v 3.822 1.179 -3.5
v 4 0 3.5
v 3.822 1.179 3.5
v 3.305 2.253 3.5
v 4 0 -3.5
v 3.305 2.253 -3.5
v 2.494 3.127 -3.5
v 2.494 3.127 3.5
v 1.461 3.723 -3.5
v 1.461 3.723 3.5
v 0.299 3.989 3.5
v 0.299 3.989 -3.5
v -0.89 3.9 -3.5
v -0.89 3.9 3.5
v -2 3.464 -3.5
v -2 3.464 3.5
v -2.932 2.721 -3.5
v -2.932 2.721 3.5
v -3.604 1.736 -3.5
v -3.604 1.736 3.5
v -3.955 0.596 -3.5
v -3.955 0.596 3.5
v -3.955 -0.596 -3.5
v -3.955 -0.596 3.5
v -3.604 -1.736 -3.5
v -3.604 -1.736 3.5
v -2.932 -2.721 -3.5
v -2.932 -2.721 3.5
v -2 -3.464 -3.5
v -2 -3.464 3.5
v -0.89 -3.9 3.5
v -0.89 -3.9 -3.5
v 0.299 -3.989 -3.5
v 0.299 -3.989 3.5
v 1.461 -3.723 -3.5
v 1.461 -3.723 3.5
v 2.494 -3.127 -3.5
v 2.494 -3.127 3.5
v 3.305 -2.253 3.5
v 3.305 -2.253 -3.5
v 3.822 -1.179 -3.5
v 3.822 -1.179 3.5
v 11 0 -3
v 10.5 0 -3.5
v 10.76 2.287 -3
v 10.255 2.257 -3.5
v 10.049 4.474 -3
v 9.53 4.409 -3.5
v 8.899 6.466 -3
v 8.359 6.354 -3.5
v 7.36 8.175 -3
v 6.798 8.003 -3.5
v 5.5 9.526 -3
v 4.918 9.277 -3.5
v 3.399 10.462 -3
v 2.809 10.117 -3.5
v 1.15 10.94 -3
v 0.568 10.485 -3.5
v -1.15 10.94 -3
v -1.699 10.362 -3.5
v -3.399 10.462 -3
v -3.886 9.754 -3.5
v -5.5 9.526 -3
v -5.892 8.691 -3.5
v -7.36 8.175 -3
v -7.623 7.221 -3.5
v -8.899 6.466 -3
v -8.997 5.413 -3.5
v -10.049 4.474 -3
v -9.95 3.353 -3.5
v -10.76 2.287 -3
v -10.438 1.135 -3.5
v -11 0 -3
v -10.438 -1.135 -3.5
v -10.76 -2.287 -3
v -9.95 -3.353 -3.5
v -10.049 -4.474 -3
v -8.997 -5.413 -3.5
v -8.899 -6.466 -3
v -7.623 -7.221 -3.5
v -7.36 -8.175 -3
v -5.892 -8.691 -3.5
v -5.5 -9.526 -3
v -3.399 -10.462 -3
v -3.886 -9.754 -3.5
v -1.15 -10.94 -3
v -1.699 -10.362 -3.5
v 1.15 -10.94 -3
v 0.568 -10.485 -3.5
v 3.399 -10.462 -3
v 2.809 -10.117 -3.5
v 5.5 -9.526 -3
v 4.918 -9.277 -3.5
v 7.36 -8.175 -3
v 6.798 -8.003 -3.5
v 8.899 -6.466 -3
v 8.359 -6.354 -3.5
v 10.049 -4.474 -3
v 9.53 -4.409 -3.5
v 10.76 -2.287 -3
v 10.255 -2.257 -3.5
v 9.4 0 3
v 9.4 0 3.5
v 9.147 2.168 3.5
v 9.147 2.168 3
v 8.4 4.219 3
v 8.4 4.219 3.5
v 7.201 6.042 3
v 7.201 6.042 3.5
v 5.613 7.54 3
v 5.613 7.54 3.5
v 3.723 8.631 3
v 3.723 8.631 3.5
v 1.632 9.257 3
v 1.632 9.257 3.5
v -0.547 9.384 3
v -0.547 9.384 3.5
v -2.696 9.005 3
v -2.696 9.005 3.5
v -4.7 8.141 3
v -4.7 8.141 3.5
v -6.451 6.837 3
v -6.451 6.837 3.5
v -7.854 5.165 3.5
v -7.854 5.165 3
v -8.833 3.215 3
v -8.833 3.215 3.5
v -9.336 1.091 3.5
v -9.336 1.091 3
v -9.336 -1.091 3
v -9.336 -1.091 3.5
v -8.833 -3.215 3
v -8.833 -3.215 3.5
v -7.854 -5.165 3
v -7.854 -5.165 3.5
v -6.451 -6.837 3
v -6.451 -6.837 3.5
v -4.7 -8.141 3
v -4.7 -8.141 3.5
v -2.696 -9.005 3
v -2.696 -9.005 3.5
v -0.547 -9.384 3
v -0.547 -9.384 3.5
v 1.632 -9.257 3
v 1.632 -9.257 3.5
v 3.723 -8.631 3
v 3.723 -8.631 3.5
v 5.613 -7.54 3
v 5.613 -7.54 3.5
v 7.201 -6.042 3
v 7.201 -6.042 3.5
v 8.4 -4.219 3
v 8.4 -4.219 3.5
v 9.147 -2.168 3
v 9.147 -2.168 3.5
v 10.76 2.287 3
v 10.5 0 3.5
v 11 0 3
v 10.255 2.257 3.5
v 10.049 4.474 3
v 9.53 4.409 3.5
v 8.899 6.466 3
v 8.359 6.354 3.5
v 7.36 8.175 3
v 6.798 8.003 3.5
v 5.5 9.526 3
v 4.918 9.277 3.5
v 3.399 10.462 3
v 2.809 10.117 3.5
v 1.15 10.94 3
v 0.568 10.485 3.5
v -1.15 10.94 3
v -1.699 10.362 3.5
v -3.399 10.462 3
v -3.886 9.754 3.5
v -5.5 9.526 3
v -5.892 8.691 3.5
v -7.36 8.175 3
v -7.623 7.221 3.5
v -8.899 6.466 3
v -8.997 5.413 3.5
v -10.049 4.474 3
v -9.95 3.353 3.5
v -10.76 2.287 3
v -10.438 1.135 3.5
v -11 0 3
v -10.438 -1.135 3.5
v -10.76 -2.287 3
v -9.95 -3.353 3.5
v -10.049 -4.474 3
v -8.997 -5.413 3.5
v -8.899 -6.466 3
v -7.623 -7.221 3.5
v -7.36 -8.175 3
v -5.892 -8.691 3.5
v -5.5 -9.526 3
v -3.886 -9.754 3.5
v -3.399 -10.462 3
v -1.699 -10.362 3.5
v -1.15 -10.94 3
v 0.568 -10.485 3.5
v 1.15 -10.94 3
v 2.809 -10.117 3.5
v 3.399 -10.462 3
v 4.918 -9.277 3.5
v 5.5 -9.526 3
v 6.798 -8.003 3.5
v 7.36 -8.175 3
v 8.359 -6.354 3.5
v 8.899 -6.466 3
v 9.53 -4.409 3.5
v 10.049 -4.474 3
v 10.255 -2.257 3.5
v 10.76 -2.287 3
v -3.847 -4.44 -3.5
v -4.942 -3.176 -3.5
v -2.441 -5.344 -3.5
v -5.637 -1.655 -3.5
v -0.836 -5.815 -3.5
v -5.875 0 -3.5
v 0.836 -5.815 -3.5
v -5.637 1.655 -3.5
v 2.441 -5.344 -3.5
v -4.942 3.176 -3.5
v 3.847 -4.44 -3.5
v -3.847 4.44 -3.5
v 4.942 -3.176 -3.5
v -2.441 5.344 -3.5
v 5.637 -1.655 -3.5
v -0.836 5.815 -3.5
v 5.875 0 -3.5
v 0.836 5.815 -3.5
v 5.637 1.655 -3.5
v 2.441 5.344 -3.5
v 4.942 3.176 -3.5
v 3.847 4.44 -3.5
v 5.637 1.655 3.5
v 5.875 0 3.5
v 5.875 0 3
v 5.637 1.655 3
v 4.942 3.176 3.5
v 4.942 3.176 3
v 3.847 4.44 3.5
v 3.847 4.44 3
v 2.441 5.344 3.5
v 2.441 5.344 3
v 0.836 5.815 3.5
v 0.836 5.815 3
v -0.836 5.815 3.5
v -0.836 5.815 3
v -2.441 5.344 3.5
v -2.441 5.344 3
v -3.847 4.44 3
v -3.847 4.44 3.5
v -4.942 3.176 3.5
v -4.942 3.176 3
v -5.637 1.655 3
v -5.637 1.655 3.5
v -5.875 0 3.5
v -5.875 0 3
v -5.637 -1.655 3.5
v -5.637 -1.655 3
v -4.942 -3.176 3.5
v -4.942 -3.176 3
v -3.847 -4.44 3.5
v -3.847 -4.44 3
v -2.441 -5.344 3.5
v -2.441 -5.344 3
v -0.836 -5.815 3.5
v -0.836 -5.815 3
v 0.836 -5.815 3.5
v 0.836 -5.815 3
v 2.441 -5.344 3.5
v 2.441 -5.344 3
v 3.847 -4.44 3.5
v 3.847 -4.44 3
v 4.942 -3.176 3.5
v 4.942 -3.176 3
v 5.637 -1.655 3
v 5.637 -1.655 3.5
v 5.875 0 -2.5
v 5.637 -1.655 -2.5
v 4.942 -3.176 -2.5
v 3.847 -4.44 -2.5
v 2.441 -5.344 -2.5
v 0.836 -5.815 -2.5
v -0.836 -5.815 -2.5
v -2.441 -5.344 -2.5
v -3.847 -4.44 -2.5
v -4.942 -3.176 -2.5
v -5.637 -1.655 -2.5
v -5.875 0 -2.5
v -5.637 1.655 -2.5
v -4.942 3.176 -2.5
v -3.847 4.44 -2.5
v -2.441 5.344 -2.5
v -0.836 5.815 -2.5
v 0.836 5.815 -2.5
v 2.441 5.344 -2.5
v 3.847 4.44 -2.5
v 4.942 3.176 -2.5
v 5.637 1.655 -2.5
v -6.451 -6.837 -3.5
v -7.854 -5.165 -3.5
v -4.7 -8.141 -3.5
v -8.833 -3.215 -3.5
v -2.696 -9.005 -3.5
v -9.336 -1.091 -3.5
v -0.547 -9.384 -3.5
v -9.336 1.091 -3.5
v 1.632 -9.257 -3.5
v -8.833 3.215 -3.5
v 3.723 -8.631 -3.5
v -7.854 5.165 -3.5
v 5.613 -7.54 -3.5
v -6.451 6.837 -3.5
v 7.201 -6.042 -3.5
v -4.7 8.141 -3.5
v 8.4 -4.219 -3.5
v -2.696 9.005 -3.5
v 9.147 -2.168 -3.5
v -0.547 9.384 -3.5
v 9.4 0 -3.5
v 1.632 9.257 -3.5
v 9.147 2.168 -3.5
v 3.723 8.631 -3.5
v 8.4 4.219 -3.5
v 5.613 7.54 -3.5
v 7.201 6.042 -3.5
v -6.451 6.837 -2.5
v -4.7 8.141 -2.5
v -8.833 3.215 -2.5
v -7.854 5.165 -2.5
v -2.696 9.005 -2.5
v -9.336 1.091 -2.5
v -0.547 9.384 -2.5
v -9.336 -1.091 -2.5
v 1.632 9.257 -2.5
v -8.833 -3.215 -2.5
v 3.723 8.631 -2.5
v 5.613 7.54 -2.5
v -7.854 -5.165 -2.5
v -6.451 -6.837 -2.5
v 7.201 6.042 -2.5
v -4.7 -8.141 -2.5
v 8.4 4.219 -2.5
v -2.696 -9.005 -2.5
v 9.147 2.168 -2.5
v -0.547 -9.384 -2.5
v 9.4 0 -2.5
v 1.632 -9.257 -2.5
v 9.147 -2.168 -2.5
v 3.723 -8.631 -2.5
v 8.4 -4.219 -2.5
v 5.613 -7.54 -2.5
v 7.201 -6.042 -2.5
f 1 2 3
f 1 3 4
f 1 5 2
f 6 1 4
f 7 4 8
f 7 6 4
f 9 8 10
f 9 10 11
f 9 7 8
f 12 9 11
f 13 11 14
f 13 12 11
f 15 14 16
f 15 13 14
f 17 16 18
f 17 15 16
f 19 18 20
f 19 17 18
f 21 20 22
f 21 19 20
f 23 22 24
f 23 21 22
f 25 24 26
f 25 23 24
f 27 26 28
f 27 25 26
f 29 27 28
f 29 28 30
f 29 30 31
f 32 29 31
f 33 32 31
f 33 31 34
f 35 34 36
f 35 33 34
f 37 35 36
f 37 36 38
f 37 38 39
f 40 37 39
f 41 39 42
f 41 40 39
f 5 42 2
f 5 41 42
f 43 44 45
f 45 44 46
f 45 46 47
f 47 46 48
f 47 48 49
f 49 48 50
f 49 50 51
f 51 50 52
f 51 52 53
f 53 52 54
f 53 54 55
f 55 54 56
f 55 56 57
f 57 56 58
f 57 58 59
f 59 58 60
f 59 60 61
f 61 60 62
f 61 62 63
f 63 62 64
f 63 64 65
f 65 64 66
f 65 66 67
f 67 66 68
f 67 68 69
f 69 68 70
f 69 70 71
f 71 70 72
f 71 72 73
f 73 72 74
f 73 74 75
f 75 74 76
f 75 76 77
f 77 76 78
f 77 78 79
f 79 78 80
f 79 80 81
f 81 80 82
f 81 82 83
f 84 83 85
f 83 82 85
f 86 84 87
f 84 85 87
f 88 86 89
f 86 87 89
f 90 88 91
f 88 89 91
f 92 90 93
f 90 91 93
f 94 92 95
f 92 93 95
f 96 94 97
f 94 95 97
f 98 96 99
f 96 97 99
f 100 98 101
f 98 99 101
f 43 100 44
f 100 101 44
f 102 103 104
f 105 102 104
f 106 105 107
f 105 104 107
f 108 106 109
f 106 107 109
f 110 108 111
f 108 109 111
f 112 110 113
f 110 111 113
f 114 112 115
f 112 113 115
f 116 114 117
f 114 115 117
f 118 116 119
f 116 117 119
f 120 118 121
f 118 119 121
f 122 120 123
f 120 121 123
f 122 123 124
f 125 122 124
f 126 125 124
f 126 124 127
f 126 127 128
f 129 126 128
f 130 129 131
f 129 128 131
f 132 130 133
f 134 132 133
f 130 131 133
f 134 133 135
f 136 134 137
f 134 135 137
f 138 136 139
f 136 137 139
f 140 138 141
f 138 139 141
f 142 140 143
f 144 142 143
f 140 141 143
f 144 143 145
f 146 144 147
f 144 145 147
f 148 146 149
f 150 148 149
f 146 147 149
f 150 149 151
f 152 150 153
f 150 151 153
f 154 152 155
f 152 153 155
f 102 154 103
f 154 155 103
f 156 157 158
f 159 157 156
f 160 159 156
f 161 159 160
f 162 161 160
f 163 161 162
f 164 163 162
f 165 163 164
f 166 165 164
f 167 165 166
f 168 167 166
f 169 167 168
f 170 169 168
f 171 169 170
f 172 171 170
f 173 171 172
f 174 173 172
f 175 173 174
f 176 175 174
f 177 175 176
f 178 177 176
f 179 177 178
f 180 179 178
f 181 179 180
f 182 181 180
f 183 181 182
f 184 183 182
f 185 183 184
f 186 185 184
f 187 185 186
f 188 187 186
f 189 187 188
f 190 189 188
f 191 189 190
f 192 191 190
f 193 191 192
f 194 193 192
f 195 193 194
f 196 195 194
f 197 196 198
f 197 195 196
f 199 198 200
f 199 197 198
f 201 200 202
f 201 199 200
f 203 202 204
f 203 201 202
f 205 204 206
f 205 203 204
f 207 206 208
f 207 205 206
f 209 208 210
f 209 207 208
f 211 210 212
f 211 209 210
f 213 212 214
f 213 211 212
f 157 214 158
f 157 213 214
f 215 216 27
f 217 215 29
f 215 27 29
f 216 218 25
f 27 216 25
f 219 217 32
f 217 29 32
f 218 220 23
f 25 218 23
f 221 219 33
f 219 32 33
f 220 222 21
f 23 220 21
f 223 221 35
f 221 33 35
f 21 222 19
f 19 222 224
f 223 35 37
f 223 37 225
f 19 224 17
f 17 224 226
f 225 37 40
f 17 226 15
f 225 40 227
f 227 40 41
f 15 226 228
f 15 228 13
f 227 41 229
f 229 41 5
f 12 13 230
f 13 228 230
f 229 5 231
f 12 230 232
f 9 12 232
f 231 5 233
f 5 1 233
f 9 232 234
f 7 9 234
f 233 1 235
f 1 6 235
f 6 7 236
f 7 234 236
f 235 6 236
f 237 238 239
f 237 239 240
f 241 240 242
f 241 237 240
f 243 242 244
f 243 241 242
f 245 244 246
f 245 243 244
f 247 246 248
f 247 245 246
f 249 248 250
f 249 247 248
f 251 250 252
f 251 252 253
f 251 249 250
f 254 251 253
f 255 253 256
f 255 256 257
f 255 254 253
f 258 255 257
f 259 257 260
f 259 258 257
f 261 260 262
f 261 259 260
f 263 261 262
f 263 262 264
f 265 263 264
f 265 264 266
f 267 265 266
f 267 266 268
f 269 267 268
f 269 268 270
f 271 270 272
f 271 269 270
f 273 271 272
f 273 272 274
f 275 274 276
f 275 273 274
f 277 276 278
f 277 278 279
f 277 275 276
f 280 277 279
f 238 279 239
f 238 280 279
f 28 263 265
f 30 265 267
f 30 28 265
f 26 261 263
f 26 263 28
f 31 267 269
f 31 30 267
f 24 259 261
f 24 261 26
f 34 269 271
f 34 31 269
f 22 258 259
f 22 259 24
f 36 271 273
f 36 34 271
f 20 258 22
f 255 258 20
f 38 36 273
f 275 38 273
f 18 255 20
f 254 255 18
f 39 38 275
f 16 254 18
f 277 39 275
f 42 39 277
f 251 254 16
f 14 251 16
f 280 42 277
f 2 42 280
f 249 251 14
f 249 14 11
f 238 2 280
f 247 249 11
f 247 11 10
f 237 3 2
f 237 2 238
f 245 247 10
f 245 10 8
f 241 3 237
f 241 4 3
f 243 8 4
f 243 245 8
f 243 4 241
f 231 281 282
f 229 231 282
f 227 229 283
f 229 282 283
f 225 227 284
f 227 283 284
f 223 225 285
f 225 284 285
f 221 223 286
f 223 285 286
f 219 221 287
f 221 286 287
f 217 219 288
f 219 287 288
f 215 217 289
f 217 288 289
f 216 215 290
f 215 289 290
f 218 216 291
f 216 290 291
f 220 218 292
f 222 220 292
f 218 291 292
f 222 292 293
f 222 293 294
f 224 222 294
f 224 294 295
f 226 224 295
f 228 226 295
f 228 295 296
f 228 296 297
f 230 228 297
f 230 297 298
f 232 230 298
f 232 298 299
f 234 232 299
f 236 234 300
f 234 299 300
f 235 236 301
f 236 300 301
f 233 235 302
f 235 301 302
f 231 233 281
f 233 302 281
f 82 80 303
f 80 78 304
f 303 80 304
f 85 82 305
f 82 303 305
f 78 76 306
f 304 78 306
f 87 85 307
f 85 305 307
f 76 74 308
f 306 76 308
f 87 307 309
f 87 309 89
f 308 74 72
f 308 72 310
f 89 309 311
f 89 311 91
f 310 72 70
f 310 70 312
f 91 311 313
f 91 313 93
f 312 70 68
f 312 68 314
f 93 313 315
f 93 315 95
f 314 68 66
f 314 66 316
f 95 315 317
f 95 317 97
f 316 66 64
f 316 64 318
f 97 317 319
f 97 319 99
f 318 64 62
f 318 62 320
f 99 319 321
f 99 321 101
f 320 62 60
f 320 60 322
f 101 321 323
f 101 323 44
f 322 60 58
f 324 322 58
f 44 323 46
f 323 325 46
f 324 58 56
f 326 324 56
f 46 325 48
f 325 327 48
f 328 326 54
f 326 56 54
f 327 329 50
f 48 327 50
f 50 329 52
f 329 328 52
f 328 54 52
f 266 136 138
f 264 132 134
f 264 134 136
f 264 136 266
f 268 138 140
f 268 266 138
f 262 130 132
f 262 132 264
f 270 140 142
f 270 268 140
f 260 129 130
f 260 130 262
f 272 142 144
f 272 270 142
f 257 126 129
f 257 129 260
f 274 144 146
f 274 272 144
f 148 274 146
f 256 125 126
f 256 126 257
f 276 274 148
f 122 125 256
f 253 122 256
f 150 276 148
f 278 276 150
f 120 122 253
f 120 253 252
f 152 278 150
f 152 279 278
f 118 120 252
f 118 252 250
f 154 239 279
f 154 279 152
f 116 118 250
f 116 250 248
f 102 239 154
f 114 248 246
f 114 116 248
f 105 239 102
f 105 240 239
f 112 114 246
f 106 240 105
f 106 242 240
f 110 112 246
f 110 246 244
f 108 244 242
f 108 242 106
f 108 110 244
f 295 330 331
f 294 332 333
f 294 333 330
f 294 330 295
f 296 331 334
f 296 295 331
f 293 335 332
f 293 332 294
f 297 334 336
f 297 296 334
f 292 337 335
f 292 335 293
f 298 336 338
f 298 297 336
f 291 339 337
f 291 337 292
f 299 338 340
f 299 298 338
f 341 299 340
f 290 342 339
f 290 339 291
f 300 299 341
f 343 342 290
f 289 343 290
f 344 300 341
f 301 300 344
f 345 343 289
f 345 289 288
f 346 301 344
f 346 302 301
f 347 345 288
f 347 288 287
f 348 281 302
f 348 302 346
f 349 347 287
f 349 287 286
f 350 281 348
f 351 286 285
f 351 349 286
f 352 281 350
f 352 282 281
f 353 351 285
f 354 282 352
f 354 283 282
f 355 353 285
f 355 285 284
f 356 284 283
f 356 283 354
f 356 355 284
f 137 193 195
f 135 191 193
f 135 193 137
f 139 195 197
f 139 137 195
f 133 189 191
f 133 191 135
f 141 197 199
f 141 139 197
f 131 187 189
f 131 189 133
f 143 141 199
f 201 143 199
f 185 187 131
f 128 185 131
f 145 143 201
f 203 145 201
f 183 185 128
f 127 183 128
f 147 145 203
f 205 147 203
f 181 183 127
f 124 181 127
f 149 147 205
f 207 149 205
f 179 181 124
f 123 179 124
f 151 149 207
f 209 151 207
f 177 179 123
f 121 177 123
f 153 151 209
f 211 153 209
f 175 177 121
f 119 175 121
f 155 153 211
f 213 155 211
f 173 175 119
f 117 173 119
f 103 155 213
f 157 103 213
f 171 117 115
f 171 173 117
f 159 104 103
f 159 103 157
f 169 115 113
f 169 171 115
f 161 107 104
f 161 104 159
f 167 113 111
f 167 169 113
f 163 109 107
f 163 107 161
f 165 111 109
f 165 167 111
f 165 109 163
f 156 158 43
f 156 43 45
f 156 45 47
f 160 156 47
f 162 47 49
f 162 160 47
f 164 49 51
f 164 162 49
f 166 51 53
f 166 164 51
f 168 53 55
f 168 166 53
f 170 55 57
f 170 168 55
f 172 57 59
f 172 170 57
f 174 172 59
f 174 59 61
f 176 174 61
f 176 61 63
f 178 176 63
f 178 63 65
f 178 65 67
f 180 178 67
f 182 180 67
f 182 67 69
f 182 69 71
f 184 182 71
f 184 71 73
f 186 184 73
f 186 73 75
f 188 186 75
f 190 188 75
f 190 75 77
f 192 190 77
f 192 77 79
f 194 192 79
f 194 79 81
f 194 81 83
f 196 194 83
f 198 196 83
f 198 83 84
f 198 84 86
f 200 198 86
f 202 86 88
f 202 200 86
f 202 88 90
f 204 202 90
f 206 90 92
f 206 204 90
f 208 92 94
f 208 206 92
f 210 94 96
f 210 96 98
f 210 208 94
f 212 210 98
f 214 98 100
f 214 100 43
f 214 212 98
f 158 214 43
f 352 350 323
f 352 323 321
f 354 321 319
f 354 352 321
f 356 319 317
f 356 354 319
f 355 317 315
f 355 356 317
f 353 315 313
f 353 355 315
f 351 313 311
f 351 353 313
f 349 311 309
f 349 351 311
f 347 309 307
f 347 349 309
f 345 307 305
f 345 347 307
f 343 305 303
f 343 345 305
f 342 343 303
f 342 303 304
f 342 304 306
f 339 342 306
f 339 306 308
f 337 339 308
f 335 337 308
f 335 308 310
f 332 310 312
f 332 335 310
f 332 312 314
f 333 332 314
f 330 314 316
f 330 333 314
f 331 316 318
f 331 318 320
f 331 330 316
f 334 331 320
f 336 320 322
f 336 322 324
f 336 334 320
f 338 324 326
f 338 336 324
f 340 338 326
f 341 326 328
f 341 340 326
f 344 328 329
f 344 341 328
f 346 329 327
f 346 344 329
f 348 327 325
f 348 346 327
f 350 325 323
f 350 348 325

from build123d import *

# Parameters (mm, degrees)
SKETCH1_R           = 11
SKETCH1_R_2         = 4
BOSS_EXTRUDE1_DEPTH = 3.5
SKETCH2_R           = 9.4
SKETCH2_R_2         = 5.875
CUT_EXTRUDE1_DEPTH  = 0.5
CUT_EXTRUDE2_START  = -1
SKETCH3_R           = 9.4
SKETCH3_R_2         = 5.875
CUT_EXTRUDE2_DEPTH  = 1
CHAMFER1_SIZE       = 0.5


with BuildPart() as part:
    # Sketch1 → Boss-Extrude1 (new, symmetric)
    with BuildSketch(Plane.XY):
        Circle(SKETCH1_R)
        Circle(SKETCH1_R_2, mode=Mode.SUBTRACT)
    extrude(amount=BOSS_EXTRUDE1_DEPTH, both=True)

    # Sketch2 → Cut-Extrude1 (cut)
    with BuildSketch(Plane.XY.offset(3.5)):
        Circle(SKETCH2_R)
        Circle(SKETCH2_R_2, mode=Mode.SUBTRACT)
    extrude(amount=-CUT_EXTRUDE1_DEPTH, mode=Mode.SUBTRACT)

    # Sketch3 → Cut-Extrude2 (cut)
    with BuildSketch(Plane(origin=(0, 0, -3.5), x_dir=(-1, 0, 0), z_dir=(0, 0, -1)).offset(CUT_EXTRUDE2_START)):
        with Locations(Location((0, 0, 0), (0, 0, 180))):
            Circle(SKETCH3_R)
        with Locations(Location((0, 0, 0), (0, 0, 180))):
            Circle(SKETCH3_R_2, mode=Mode.SUBTRACT)
    extrude(amount=CUT_EXTRUDE2_DEPTH, mode=Mode.SUBTRACT)

    # Chamfer1
    chamfer1_edges = [part.edges().sort_by_distance(p)[0] for p in [
        (-11, 0, -3.5),
        (-11, 0, 3.5),
    ]]
    chamfer(chamfer1_edges, length=CHAMFER1_SIZE)


solid = part.part
